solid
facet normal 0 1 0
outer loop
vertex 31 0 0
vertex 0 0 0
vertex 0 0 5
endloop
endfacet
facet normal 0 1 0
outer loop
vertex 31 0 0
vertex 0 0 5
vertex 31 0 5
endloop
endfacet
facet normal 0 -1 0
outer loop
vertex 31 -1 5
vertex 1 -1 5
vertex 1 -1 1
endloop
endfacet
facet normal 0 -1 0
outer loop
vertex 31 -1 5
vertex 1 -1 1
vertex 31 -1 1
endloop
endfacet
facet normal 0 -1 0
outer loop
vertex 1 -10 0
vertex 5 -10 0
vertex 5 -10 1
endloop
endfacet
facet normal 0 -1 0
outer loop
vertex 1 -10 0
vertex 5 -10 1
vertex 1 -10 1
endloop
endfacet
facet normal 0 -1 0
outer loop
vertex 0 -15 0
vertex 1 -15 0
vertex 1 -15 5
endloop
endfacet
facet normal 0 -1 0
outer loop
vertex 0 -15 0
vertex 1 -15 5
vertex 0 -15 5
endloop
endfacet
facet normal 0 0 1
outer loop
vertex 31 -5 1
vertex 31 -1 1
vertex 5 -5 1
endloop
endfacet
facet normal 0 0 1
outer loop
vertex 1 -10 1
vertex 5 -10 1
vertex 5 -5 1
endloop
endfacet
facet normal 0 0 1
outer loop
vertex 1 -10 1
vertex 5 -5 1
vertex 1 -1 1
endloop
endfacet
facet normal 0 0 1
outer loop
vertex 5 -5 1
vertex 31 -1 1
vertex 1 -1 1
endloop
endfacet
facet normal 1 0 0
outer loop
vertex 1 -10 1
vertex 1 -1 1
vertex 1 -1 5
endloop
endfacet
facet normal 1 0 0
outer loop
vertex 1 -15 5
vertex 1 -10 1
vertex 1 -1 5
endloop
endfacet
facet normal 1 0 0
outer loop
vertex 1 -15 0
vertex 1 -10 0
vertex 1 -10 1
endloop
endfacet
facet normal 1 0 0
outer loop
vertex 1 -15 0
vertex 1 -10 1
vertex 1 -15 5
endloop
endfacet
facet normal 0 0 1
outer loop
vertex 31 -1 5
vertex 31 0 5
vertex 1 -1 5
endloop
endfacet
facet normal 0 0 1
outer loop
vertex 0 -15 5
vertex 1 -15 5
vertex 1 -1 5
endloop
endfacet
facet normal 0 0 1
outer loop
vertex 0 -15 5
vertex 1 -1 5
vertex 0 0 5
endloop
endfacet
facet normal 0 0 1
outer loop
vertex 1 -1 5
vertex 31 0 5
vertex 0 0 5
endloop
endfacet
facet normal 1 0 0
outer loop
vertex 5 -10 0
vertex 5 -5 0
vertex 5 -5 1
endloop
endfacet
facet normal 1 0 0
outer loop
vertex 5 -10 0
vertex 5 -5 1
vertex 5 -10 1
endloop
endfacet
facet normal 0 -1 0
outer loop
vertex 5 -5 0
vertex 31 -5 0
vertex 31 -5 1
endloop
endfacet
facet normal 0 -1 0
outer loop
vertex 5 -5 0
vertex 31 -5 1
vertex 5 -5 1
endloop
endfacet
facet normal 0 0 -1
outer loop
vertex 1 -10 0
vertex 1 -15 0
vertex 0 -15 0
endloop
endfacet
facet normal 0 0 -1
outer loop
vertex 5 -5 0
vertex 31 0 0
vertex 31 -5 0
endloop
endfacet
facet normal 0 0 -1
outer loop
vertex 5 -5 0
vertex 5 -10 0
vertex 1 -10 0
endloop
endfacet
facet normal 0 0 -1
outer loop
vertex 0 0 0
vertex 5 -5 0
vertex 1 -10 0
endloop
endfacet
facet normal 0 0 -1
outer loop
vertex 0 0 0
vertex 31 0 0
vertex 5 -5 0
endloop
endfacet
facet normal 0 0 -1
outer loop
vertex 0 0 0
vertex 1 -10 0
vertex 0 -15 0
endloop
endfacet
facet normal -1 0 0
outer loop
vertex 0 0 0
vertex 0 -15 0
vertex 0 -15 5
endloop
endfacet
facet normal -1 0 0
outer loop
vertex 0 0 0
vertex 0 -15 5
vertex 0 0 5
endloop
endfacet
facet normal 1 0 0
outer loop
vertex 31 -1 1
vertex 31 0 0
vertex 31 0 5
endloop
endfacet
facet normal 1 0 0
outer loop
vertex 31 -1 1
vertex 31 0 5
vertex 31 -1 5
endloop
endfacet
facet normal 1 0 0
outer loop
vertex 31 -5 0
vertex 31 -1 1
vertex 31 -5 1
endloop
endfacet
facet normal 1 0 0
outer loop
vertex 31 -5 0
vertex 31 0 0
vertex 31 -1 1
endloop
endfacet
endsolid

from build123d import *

# Parameters (mm, degrees)
BOSS_EXTRU_1_DEPTH      = 5
ENL_V_MAT_EXTRU_1_DEPTH = 4


with BuildPart() as part:
    # Esquisse1 → Boss.-Extru.1 (new body)
    with BuildSketch(Plane.XY):
        Polygon((0, 0), (31, 0), (31, -5), (5, -5), (5, -10), (1, -10), (1, -15), (0, -15), align=None)
    extrude(amount=BOSS_EXTRU_1_DEPTH)

    # Esquisse2 → Enlèv. mat.-Extru.1 (cut)
    with BuildSketch(Plane.XY.offset(5)):
        Polygon((1, -10), (1, -1), (31, -1), (31, -5), (5, -5), (5, -10), align=None)
    extrude(amount=-ENL_V_MAT_EXTRU_1_DEPTH, mode=Mode.SUBTRACT)


solid = part.part
